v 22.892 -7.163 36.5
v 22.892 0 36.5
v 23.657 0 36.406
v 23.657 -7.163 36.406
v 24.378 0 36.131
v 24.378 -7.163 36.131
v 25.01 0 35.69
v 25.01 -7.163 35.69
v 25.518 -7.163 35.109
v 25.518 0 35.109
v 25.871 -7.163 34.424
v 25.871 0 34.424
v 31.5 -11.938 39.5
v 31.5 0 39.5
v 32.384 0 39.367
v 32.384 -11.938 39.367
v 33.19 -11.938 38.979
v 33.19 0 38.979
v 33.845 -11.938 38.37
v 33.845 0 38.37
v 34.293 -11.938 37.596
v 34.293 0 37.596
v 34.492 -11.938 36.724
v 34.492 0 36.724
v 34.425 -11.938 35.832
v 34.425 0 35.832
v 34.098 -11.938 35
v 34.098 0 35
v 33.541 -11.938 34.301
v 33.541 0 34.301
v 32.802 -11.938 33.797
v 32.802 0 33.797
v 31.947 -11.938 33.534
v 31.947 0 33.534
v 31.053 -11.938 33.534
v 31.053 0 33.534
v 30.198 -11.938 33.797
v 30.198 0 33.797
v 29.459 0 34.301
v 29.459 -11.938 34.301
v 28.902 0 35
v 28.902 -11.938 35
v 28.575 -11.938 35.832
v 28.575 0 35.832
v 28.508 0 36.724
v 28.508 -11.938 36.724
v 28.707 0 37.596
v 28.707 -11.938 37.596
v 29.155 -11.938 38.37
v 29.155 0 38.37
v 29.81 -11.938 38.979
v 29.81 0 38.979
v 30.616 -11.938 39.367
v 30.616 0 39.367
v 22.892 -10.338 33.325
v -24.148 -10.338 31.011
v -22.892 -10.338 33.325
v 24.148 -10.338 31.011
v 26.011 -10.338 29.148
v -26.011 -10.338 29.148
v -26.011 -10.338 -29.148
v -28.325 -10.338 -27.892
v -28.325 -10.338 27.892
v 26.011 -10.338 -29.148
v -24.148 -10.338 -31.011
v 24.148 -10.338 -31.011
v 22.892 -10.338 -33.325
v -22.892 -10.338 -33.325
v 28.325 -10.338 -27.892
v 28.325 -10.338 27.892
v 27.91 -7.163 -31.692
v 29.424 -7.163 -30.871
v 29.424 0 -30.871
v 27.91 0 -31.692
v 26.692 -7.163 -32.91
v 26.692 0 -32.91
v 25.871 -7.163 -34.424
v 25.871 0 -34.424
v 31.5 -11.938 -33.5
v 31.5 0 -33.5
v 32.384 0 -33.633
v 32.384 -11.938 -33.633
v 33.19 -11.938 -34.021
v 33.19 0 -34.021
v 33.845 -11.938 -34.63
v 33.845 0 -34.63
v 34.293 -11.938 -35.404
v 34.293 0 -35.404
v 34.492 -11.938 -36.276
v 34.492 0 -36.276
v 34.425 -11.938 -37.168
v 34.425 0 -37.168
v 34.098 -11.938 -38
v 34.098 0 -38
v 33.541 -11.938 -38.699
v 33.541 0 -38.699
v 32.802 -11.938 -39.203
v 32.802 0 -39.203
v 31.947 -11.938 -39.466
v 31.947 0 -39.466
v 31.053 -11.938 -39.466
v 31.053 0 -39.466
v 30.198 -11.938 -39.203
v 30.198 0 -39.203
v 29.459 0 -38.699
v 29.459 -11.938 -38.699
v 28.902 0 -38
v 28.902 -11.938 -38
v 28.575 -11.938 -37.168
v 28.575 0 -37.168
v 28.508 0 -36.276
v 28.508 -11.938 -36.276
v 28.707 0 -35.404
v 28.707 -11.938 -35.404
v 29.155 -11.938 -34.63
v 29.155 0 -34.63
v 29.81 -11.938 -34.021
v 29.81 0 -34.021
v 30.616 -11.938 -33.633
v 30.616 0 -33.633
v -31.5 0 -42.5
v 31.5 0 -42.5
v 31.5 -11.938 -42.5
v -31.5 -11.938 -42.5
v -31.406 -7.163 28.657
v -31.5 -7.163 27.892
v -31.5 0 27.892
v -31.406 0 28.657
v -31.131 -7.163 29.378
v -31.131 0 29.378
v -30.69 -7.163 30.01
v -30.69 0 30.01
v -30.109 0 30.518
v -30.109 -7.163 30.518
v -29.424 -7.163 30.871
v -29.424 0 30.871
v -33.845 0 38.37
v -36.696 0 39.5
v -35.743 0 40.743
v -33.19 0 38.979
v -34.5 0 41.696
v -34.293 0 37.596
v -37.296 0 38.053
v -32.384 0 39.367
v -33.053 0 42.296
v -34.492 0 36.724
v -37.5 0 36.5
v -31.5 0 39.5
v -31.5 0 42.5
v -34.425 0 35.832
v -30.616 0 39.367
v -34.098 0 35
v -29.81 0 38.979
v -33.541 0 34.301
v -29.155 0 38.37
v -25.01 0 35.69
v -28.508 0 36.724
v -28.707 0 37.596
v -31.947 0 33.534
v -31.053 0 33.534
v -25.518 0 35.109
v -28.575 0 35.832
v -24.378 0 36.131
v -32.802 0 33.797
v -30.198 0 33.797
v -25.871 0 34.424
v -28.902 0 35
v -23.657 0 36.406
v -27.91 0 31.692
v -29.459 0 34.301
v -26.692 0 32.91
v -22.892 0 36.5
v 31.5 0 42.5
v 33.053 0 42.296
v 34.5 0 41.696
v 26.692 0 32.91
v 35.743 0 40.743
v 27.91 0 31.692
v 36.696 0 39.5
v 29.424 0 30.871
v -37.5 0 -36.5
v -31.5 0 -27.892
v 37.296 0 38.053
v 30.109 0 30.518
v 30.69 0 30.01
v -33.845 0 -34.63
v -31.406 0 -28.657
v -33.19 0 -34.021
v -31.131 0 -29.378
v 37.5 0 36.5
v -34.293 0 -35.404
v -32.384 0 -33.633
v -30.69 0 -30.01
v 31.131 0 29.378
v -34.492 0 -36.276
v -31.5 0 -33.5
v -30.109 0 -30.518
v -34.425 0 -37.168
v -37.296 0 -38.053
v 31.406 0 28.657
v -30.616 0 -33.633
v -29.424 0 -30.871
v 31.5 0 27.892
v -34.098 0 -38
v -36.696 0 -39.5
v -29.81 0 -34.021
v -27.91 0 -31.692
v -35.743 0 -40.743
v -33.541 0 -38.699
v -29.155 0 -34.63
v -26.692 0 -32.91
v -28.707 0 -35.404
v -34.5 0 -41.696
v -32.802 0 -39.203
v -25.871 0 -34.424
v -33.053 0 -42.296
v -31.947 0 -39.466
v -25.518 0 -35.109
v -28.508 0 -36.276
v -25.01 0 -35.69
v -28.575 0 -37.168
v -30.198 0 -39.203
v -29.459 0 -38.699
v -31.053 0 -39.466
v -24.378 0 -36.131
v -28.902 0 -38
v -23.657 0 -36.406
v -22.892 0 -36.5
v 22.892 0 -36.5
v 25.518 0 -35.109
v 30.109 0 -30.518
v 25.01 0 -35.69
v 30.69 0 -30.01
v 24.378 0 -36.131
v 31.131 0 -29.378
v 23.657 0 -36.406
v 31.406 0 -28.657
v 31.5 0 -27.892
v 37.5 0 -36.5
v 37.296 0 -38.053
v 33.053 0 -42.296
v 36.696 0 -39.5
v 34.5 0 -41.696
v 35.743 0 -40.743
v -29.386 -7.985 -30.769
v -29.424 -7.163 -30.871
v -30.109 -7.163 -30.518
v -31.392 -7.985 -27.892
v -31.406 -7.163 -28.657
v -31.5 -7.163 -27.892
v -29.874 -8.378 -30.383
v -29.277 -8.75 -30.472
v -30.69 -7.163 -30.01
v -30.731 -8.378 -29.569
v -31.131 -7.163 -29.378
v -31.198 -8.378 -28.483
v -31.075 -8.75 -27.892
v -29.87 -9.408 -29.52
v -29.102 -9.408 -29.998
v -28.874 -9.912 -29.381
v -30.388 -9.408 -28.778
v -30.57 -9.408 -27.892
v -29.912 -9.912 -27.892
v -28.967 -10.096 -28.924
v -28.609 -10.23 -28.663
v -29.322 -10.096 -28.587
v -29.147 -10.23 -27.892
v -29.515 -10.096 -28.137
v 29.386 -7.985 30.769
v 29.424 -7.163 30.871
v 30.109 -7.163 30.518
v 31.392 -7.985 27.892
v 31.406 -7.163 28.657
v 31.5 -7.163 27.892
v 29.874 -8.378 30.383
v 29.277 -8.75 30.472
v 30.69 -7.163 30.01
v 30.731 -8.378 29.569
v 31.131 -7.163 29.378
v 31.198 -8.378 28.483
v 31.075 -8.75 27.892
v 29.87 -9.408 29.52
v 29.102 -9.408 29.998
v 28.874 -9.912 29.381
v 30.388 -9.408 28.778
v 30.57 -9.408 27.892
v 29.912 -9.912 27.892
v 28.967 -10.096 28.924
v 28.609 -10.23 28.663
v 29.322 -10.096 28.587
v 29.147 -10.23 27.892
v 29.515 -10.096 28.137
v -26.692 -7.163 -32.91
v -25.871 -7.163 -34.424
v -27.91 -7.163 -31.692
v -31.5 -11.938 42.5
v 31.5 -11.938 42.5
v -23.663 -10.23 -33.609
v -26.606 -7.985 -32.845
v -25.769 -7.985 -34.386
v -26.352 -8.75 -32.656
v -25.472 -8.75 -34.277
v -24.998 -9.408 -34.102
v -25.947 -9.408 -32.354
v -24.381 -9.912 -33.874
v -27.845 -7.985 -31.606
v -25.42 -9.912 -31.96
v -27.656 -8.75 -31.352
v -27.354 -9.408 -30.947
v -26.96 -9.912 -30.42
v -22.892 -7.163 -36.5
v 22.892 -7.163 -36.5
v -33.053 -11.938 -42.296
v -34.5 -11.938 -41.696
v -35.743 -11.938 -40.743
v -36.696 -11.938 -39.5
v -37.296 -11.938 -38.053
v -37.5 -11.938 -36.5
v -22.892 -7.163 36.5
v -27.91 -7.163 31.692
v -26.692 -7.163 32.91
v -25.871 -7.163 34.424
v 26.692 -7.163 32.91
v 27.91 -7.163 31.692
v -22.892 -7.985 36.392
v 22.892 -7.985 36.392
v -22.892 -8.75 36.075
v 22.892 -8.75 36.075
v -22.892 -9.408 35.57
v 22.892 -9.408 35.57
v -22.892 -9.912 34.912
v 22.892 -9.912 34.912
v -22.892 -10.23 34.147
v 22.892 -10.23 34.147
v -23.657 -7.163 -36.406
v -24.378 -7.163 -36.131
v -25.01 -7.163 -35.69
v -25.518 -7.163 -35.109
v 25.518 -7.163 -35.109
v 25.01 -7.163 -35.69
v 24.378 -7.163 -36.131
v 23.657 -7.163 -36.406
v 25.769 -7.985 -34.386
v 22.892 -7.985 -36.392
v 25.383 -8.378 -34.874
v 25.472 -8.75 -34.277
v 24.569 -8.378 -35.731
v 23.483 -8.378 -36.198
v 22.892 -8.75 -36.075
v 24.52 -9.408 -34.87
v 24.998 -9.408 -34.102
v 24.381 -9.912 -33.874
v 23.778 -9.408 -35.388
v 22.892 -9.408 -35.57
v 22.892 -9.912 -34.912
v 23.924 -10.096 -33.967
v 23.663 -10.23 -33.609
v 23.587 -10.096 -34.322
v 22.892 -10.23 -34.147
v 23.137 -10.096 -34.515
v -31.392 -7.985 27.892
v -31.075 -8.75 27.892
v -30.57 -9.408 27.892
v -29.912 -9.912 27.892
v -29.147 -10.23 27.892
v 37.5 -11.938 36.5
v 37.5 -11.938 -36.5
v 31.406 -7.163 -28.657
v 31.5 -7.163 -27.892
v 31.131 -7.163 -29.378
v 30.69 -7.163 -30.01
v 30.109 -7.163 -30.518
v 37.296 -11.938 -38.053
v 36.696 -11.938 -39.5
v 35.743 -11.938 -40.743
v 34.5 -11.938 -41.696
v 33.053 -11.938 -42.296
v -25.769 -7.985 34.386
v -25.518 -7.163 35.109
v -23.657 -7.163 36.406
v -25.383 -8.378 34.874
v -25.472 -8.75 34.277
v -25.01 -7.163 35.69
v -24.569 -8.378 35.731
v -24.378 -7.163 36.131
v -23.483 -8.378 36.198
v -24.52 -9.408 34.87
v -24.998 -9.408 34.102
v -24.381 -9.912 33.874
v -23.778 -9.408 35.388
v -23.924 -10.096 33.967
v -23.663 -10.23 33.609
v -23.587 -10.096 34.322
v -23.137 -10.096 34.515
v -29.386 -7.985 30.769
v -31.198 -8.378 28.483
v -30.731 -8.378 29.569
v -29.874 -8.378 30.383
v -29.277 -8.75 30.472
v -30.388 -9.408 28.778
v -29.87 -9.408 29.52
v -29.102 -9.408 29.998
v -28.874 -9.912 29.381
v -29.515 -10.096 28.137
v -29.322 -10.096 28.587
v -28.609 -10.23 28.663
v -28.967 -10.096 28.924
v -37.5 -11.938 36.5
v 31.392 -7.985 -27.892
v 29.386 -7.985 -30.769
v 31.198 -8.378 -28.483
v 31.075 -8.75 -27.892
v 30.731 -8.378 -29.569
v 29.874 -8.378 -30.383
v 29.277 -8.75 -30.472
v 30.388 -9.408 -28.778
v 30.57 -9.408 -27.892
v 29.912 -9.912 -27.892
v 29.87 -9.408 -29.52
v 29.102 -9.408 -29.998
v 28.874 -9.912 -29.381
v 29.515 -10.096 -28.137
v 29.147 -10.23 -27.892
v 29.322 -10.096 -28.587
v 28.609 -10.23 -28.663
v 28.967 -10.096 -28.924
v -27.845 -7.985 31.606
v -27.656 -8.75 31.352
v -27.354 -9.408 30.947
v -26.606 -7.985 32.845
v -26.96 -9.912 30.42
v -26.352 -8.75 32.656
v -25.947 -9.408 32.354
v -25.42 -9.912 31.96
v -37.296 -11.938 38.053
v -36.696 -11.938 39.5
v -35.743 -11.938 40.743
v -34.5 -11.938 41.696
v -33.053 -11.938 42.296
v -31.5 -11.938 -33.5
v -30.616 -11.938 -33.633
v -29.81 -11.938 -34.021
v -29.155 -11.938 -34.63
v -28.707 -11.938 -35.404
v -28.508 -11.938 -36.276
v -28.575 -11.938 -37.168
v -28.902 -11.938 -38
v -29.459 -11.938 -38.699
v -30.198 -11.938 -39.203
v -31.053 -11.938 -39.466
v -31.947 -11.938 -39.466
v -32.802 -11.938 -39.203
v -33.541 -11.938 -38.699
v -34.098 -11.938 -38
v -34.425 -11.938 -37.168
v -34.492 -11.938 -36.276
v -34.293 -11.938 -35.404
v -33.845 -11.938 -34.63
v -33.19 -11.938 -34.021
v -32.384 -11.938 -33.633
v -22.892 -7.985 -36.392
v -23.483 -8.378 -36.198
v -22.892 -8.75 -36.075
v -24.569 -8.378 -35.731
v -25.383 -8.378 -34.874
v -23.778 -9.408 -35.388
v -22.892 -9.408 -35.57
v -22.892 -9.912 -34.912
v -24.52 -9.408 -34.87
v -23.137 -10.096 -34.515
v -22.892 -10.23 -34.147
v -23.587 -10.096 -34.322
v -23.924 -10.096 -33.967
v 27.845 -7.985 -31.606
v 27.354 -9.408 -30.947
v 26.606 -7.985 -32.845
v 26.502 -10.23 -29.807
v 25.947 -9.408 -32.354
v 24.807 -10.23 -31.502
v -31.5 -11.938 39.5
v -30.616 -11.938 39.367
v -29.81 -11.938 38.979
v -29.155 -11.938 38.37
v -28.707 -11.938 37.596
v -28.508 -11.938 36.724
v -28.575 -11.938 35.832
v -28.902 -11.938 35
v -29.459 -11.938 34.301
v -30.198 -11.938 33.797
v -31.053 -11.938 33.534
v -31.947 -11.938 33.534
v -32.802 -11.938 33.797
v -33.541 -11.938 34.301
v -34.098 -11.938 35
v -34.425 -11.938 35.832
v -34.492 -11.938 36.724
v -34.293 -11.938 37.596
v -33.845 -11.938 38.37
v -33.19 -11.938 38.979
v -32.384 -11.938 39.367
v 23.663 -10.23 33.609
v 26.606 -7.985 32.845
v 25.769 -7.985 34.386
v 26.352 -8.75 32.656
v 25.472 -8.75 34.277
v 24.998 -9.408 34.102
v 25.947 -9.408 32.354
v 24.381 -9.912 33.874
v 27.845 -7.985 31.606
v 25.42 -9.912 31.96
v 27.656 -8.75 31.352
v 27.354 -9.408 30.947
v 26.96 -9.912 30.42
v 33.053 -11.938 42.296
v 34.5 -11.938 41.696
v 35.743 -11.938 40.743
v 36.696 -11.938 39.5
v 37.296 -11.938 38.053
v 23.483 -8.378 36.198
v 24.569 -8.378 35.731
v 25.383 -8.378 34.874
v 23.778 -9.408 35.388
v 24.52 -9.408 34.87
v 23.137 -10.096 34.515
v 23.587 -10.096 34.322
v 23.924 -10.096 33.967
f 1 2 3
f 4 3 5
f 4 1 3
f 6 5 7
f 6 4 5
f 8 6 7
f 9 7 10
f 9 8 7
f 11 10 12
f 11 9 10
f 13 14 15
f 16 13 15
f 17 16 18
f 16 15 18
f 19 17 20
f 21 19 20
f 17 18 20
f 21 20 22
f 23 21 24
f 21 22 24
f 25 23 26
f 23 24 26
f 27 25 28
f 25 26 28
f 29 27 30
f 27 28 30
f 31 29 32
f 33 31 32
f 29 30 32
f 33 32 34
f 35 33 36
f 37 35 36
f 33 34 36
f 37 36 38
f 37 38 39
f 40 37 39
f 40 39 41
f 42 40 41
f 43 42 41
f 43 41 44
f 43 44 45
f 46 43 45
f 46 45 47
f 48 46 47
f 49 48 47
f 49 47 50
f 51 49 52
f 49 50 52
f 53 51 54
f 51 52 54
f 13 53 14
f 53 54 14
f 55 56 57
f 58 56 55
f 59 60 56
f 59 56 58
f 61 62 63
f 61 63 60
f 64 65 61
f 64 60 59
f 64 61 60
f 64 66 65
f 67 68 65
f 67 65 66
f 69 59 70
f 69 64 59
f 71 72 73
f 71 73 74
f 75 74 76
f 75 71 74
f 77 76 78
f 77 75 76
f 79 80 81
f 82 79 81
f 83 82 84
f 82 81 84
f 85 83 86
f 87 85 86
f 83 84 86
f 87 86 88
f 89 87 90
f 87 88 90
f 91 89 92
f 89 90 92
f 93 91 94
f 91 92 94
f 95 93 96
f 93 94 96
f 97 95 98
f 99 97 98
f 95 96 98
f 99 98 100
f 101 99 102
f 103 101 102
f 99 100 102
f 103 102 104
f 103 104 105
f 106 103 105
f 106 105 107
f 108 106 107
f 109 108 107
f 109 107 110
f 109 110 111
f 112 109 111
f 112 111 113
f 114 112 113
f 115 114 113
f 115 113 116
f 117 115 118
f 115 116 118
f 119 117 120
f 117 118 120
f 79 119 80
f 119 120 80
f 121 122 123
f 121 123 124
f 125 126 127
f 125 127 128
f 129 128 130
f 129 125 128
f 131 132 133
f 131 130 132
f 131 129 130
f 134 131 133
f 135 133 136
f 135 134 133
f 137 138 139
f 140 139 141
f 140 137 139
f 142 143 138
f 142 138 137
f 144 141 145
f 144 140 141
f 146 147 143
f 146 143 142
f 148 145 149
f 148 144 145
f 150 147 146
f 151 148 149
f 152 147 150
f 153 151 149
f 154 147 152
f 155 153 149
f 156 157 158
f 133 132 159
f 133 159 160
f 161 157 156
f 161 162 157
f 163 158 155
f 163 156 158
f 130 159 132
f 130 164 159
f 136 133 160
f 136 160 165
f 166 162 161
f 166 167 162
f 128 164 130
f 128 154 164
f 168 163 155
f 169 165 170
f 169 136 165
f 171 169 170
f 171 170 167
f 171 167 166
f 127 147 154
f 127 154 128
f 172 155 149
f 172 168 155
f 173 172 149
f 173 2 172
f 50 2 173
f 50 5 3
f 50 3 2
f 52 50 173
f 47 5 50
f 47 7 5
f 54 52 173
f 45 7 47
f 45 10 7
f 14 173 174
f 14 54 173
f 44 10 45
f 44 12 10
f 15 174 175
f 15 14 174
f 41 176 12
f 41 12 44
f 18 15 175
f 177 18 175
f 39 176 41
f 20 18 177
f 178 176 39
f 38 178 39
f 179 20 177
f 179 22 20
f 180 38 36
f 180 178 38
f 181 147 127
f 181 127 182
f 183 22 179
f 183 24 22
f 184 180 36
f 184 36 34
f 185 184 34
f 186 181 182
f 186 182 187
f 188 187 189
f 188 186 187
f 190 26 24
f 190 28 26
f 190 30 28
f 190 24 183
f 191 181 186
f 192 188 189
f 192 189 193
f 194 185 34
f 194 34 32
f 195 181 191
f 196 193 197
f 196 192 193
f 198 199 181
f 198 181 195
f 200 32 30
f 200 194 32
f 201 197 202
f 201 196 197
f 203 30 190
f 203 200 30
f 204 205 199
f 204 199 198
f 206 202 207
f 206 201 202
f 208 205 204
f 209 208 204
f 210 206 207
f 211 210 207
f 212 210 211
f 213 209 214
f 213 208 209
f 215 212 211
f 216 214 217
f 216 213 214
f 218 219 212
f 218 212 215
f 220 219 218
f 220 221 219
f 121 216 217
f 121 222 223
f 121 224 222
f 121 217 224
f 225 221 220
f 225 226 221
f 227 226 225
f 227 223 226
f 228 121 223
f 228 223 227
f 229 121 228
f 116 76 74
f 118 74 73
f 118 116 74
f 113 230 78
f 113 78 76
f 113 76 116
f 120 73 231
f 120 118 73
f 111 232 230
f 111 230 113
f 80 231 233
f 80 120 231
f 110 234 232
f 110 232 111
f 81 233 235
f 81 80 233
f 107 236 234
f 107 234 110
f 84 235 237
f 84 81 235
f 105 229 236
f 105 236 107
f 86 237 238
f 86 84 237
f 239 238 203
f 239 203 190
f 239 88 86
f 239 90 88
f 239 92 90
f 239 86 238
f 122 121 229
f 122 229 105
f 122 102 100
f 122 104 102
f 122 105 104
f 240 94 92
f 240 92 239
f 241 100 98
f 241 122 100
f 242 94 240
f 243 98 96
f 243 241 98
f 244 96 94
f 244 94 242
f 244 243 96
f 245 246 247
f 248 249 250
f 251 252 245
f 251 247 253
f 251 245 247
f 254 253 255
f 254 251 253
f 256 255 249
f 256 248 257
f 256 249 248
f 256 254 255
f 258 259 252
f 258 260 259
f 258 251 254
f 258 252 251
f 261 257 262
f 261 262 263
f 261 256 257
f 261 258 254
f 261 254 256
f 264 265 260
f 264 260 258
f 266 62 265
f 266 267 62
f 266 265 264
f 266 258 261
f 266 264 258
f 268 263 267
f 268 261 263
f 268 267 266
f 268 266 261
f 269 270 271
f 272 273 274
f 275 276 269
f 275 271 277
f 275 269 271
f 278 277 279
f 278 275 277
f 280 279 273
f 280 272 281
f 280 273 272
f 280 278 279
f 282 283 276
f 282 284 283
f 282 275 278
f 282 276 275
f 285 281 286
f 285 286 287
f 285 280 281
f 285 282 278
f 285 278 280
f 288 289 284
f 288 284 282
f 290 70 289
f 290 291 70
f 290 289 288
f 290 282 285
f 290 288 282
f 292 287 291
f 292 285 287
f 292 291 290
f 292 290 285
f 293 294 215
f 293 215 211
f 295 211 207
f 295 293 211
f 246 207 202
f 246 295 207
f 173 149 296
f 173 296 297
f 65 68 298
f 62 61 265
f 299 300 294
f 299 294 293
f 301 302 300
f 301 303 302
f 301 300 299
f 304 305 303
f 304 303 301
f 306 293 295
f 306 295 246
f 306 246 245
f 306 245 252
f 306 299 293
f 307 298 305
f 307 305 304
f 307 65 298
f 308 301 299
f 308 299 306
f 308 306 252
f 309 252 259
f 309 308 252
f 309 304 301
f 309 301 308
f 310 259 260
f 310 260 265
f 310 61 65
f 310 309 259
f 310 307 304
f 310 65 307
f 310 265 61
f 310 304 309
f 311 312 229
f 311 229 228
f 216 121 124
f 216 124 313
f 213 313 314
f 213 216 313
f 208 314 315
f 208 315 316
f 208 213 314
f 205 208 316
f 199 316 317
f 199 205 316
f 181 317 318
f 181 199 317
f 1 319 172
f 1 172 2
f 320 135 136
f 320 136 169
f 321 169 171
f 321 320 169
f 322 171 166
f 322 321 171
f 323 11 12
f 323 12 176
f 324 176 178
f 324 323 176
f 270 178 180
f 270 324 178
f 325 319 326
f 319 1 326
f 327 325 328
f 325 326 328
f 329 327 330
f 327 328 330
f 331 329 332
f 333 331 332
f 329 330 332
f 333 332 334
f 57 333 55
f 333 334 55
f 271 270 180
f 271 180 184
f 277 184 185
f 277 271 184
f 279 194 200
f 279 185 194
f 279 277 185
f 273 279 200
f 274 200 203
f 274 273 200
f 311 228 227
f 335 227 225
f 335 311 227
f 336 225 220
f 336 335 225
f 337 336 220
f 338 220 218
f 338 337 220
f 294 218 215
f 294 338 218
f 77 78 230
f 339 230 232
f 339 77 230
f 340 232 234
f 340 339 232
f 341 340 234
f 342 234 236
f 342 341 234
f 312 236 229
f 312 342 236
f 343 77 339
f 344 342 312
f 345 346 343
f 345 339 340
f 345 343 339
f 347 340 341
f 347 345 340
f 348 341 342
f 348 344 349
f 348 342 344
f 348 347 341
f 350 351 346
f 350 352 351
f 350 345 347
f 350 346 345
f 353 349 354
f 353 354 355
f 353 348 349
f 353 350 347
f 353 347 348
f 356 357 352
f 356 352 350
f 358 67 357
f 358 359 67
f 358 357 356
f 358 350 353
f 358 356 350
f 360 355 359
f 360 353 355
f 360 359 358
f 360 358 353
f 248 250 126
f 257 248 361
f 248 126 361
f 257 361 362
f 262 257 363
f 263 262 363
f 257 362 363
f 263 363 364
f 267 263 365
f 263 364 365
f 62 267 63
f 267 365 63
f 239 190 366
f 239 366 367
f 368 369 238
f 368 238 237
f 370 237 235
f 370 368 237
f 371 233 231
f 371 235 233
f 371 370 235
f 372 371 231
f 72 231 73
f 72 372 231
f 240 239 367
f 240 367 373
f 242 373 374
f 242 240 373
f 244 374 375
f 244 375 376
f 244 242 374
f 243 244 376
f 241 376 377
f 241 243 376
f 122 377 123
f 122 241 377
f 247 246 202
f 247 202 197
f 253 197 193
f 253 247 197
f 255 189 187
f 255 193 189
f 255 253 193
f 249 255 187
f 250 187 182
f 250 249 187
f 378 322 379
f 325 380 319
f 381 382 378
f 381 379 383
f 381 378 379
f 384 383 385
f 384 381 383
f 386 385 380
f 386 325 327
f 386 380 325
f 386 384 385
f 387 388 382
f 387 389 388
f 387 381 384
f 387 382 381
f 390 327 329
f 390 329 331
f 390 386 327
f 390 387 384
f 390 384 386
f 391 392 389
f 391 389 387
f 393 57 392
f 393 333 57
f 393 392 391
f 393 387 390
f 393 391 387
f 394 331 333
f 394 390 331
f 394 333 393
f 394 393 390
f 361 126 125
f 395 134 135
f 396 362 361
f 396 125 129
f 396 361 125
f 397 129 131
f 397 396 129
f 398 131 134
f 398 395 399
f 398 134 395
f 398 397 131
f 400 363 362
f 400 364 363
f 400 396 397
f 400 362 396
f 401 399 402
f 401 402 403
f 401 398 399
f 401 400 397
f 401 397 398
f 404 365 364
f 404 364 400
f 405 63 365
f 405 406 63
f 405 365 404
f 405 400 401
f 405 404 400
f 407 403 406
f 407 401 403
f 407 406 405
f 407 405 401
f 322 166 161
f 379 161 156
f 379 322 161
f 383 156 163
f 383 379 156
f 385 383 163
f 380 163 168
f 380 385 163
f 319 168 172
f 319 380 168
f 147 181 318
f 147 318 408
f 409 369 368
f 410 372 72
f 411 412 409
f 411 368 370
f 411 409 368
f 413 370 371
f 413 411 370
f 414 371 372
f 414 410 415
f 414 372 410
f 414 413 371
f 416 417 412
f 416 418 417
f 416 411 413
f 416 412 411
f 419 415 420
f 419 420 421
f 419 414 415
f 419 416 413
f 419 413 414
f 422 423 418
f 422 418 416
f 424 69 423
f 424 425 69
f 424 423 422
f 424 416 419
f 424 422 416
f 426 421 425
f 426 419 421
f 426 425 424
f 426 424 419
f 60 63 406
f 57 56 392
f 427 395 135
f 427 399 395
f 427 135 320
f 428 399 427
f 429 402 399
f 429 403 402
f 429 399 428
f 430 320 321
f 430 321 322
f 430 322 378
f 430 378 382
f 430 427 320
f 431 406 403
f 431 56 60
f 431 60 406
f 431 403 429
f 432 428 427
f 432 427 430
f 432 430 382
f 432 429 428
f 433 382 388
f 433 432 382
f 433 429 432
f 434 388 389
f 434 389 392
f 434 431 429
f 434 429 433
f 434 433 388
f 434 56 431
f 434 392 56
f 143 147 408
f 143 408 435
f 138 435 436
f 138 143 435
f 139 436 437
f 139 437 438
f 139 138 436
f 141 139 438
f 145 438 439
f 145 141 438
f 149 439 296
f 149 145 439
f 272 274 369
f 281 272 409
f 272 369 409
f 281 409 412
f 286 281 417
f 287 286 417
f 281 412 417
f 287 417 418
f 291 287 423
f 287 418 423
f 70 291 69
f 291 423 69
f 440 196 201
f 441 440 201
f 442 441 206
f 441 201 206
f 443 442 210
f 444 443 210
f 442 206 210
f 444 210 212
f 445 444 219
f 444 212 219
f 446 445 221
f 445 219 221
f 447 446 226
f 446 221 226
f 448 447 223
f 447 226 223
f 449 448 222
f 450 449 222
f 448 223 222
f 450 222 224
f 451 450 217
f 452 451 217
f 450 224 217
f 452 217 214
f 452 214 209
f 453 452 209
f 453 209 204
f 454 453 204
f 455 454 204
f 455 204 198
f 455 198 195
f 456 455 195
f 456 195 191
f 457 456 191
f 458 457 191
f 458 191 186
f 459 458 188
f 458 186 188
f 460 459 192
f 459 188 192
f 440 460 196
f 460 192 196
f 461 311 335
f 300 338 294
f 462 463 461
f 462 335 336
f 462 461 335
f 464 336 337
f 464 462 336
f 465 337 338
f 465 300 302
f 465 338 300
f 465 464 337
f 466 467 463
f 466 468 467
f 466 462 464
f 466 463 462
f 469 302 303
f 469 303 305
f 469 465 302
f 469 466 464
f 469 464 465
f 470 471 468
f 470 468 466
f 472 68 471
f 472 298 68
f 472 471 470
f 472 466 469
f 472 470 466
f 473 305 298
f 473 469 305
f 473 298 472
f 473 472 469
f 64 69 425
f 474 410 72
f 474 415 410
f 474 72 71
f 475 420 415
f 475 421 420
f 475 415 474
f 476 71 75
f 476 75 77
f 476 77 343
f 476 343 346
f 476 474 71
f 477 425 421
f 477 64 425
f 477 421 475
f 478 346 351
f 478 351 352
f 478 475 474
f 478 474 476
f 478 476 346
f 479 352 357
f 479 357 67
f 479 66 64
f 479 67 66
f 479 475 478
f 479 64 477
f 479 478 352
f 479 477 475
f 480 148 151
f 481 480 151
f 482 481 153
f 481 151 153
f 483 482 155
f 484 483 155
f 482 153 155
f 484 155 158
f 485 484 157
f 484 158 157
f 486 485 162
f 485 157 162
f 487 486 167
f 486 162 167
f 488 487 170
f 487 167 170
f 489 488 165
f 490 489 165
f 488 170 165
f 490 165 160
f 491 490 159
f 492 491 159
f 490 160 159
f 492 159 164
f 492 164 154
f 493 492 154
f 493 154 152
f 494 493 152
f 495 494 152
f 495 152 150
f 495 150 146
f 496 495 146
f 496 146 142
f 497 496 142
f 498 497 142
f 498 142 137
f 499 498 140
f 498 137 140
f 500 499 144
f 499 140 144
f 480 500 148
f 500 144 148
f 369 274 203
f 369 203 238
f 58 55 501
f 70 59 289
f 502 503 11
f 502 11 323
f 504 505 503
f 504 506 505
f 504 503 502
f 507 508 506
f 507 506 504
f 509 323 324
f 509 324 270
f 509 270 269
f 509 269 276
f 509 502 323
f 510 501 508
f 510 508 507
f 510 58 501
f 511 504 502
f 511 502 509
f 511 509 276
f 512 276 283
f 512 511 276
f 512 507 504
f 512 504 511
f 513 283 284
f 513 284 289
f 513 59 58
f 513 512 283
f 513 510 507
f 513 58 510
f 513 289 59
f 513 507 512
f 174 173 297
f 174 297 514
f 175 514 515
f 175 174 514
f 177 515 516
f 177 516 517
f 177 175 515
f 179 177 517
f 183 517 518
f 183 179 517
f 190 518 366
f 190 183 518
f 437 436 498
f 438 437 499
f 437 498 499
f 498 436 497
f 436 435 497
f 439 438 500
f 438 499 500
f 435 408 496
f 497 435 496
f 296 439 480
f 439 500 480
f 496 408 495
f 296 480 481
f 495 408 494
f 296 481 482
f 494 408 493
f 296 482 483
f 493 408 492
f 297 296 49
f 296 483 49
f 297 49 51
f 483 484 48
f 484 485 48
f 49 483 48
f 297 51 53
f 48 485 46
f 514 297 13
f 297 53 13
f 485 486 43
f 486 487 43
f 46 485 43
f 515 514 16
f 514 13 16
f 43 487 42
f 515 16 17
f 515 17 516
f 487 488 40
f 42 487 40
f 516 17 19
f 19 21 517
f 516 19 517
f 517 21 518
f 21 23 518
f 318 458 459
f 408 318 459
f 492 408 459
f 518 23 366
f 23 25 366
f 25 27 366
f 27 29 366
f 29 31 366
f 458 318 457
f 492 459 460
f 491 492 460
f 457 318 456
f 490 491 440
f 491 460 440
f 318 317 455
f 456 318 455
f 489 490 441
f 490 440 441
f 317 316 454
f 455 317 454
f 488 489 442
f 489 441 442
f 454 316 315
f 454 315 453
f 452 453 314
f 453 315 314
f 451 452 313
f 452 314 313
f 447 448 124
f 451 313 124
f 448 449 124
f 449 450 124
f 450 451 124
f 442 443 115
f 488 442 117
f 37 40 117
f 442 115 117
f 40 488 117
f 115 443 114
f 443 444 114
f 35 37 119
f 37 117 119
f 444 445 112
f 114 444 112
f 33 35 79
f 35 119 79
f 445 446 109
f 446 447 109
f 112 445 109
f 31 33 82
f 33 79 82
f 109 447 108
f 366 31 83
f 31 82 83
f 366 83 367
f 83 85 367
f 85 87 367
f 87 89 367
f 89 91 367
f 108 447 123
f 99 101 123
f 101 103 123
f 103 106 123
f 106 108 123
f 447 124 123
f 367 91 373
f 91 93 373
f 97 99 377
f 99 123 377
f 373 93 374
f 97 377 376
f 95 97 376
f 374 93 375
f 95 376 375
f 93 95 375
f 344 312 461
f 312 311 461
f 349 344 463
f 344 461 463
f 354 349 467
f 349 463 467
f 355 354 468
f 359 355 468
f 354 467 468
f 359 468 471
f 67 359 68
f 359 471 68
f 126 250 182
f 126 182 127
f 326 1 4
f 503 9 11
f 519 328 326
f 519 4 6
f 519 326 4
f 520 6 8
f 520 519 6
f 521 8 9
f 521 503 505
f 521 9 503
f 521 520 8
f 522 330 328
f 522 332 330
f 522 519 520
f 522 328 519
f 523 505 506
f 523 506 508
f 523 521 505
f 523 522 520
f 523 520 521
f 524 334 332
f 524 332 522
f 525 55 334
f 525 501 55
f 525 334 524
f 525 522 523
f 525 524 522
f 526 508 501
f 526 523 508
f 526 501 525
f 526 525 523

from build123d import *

# Parameters (mm, degrees)
SKETCH1_R               = 3
BOSS_EXTRUDE1_DEPTH     = 11.938
CUT_EXTRUDE1_DEPTH      = 58.922498599
CUT_EXTRUDE1_DEPTH_BACK = 10.3378
FILLET1_R               = 3.175


with BuildPart() as part:
    # Sketch1 → Boss-Extrude1 (new body)
    with BuildSketch(Plane(origin=(0, 0, 0), x_dir=(1, 0, 0), z_dir=(0, 1, 0))):
        with BuildLine():
            Line((-31.5, -42.5), (31.5, -42.5))
            ThreePointArc((31.5, -42.5), (35.742640687, -40.742640687), (37.5, -36.5))
            Line((37.5, -36.5), (37.5, 36.5))
            ThreePointArc((37.5, 36.5), (35.742640687, 40.742640687), (31.5, 42.5))
            Line((31.5, 42.5), (-31.5, 42.5))
            ThreePointArc((-31.5, 42.5), (-35.742640687, 40.742640687), (-37.5, 36.5))
            Line((-37.5, 36.5), (-37.5, -36.5))
            ThreePointArc((-37.5, -36.5), (-35.742640687, -40.742640687), (-31.5, -42.5))
        make_face()
        with Locations(Location((-31.5, 36.5, 0), (0, 0, 270))):
            Circle(SKETCH1_R, mode=Mode.SUBTRACT)
        with Locations(Location((-31.5, -36.5, 0), (0, 0, 270))):
            Circle(SKETCH1_R, mode=Mode.SUBTRACT)
        with Locations(Location((31.5, -36.5, 0), (0, 0, 270))):
            Circle(SKETCH1_R, mode=Mode.SUBTRACT)
        with Locations(Location((31.5, 36.5, 0), (0, 0, 270))):
            Circle(SKETCH1_R, mode=Mode.SUBTRACT)
    extrude(amount=-BOSS_EXTRUDE1_DEPTH)

    # Sketch2 → Cut-Extrude1 (cut, two sides: drawn at the far end of the back side and taken through both)
    with BuildSketch(Plane(origin=(0, 0, 0), x_dir=(1, 0, 0), z_dir=(0, 1, 0)).offset(-CUT_EXTRUDE1_DEPTH_BACK)):
        with BuildLine():
            Line((-22.891864313, -36.5), (22.891864313, -36.5))
            ThreePointArc((22.891864313, -36.5), (24.707385496, -35.929708781), (25.870701458, -34.423705722))
            ThreePointArc((25.870701458, -34.423705722), (27.257359313, -32.257359313), (29.423705722, -30.870701458))
            ThreePointArc((29.423705722, -30.870701458), (30.929708781, -29.707385496), (31.5, -27.891864313))
            Line((31.5, -27.891864313), (31.5, 27.891864313))
            ThreePointArc((31.5, 27.891864313), (30.929708781, 29.707385496), (29.423705722, 30.870701458))
            ThreePointArc((29.423705722, 30.870701458), (27.257359313, 32.257359313), (25.870701458, 34.423705722))
            ThreePointArc((25.870701458, 34.423705722), (24.707385496, 35.929708781), (22.891864313, 36.5))
            Line((22.891864313, 36.5), (-22.891864313, 36.5))
            ThreePointArc((-22.891864313, 36.5), (-24.707385496, 35.929708781), (-25.870701458, 34.423705722))
            ThreePointArc((-25.870701458, 34.423705722), (-27.257359313, 32.257359313), (-29.423705722, 30.870701458))
            ThreePointArc((-29.423705722, 30.870701458), (-30.929708781, 29.707385496), (-31.5, 27.891864313))
            Line((-31.5, 27.891864313), (-31.5, -27.891864313))
            ThreePointArc((-31.5, -27.891864313), (-30.929708781, -29.707385496), (-29.423705722, -30.870701458))
            ThreePointArc((-29.423705722, -30.870701458), (-27.257359313, -32.257359313), (-25.870701458, -34.423705722))
            ThreePointArc((-25.870701458, -34.423705722), (-24.707385496, -35.929708781), (-22.891864313, -36.5))
        make_face()
    extrude(amount=CUT_EXTRUDE1_DEPTH + CUT_EXTRUDE1_DEPTH_BACK, mode=Mode.SUBTRACT)

    # Fillet1
    fillet1_edges = [part.edges().sort_by_distance(p)[0] for p in [
        (24.707385496, -10.3378, -35.929708781),
        (27.257359313, -10.3378, -32.257359313),
        (30.929708781, -10.3378, -29.707385496),
        (31.5, -10.3378, 0),
        (30.929708781, -10.3378, 29.707385496),
        (27.257359313, -10.3378, 32.257359313),
        (24.707385496, -10.3378, 35.929708781),
        (0, -10.3378, 36.5),
        (-24.707385496, -10.3378, 35.929708781),
        (-27.257359313, -10.3378, 32.257359313),
        (-30.929708781, -10.3378, 29.707385496),
        (-31.5, -10.3378, 0),
        (-30.929708781, -10.3378, -29.707385496),
        (-27.257359313, -10.3378, -32.257359313),
        (-24.707385496, -10.3378, -35.929708781),
        (0, -10.3378, -36.5),
    ]]
    fillet(fillet1_edges, radius=FILLET1_R)


solid = part.part
